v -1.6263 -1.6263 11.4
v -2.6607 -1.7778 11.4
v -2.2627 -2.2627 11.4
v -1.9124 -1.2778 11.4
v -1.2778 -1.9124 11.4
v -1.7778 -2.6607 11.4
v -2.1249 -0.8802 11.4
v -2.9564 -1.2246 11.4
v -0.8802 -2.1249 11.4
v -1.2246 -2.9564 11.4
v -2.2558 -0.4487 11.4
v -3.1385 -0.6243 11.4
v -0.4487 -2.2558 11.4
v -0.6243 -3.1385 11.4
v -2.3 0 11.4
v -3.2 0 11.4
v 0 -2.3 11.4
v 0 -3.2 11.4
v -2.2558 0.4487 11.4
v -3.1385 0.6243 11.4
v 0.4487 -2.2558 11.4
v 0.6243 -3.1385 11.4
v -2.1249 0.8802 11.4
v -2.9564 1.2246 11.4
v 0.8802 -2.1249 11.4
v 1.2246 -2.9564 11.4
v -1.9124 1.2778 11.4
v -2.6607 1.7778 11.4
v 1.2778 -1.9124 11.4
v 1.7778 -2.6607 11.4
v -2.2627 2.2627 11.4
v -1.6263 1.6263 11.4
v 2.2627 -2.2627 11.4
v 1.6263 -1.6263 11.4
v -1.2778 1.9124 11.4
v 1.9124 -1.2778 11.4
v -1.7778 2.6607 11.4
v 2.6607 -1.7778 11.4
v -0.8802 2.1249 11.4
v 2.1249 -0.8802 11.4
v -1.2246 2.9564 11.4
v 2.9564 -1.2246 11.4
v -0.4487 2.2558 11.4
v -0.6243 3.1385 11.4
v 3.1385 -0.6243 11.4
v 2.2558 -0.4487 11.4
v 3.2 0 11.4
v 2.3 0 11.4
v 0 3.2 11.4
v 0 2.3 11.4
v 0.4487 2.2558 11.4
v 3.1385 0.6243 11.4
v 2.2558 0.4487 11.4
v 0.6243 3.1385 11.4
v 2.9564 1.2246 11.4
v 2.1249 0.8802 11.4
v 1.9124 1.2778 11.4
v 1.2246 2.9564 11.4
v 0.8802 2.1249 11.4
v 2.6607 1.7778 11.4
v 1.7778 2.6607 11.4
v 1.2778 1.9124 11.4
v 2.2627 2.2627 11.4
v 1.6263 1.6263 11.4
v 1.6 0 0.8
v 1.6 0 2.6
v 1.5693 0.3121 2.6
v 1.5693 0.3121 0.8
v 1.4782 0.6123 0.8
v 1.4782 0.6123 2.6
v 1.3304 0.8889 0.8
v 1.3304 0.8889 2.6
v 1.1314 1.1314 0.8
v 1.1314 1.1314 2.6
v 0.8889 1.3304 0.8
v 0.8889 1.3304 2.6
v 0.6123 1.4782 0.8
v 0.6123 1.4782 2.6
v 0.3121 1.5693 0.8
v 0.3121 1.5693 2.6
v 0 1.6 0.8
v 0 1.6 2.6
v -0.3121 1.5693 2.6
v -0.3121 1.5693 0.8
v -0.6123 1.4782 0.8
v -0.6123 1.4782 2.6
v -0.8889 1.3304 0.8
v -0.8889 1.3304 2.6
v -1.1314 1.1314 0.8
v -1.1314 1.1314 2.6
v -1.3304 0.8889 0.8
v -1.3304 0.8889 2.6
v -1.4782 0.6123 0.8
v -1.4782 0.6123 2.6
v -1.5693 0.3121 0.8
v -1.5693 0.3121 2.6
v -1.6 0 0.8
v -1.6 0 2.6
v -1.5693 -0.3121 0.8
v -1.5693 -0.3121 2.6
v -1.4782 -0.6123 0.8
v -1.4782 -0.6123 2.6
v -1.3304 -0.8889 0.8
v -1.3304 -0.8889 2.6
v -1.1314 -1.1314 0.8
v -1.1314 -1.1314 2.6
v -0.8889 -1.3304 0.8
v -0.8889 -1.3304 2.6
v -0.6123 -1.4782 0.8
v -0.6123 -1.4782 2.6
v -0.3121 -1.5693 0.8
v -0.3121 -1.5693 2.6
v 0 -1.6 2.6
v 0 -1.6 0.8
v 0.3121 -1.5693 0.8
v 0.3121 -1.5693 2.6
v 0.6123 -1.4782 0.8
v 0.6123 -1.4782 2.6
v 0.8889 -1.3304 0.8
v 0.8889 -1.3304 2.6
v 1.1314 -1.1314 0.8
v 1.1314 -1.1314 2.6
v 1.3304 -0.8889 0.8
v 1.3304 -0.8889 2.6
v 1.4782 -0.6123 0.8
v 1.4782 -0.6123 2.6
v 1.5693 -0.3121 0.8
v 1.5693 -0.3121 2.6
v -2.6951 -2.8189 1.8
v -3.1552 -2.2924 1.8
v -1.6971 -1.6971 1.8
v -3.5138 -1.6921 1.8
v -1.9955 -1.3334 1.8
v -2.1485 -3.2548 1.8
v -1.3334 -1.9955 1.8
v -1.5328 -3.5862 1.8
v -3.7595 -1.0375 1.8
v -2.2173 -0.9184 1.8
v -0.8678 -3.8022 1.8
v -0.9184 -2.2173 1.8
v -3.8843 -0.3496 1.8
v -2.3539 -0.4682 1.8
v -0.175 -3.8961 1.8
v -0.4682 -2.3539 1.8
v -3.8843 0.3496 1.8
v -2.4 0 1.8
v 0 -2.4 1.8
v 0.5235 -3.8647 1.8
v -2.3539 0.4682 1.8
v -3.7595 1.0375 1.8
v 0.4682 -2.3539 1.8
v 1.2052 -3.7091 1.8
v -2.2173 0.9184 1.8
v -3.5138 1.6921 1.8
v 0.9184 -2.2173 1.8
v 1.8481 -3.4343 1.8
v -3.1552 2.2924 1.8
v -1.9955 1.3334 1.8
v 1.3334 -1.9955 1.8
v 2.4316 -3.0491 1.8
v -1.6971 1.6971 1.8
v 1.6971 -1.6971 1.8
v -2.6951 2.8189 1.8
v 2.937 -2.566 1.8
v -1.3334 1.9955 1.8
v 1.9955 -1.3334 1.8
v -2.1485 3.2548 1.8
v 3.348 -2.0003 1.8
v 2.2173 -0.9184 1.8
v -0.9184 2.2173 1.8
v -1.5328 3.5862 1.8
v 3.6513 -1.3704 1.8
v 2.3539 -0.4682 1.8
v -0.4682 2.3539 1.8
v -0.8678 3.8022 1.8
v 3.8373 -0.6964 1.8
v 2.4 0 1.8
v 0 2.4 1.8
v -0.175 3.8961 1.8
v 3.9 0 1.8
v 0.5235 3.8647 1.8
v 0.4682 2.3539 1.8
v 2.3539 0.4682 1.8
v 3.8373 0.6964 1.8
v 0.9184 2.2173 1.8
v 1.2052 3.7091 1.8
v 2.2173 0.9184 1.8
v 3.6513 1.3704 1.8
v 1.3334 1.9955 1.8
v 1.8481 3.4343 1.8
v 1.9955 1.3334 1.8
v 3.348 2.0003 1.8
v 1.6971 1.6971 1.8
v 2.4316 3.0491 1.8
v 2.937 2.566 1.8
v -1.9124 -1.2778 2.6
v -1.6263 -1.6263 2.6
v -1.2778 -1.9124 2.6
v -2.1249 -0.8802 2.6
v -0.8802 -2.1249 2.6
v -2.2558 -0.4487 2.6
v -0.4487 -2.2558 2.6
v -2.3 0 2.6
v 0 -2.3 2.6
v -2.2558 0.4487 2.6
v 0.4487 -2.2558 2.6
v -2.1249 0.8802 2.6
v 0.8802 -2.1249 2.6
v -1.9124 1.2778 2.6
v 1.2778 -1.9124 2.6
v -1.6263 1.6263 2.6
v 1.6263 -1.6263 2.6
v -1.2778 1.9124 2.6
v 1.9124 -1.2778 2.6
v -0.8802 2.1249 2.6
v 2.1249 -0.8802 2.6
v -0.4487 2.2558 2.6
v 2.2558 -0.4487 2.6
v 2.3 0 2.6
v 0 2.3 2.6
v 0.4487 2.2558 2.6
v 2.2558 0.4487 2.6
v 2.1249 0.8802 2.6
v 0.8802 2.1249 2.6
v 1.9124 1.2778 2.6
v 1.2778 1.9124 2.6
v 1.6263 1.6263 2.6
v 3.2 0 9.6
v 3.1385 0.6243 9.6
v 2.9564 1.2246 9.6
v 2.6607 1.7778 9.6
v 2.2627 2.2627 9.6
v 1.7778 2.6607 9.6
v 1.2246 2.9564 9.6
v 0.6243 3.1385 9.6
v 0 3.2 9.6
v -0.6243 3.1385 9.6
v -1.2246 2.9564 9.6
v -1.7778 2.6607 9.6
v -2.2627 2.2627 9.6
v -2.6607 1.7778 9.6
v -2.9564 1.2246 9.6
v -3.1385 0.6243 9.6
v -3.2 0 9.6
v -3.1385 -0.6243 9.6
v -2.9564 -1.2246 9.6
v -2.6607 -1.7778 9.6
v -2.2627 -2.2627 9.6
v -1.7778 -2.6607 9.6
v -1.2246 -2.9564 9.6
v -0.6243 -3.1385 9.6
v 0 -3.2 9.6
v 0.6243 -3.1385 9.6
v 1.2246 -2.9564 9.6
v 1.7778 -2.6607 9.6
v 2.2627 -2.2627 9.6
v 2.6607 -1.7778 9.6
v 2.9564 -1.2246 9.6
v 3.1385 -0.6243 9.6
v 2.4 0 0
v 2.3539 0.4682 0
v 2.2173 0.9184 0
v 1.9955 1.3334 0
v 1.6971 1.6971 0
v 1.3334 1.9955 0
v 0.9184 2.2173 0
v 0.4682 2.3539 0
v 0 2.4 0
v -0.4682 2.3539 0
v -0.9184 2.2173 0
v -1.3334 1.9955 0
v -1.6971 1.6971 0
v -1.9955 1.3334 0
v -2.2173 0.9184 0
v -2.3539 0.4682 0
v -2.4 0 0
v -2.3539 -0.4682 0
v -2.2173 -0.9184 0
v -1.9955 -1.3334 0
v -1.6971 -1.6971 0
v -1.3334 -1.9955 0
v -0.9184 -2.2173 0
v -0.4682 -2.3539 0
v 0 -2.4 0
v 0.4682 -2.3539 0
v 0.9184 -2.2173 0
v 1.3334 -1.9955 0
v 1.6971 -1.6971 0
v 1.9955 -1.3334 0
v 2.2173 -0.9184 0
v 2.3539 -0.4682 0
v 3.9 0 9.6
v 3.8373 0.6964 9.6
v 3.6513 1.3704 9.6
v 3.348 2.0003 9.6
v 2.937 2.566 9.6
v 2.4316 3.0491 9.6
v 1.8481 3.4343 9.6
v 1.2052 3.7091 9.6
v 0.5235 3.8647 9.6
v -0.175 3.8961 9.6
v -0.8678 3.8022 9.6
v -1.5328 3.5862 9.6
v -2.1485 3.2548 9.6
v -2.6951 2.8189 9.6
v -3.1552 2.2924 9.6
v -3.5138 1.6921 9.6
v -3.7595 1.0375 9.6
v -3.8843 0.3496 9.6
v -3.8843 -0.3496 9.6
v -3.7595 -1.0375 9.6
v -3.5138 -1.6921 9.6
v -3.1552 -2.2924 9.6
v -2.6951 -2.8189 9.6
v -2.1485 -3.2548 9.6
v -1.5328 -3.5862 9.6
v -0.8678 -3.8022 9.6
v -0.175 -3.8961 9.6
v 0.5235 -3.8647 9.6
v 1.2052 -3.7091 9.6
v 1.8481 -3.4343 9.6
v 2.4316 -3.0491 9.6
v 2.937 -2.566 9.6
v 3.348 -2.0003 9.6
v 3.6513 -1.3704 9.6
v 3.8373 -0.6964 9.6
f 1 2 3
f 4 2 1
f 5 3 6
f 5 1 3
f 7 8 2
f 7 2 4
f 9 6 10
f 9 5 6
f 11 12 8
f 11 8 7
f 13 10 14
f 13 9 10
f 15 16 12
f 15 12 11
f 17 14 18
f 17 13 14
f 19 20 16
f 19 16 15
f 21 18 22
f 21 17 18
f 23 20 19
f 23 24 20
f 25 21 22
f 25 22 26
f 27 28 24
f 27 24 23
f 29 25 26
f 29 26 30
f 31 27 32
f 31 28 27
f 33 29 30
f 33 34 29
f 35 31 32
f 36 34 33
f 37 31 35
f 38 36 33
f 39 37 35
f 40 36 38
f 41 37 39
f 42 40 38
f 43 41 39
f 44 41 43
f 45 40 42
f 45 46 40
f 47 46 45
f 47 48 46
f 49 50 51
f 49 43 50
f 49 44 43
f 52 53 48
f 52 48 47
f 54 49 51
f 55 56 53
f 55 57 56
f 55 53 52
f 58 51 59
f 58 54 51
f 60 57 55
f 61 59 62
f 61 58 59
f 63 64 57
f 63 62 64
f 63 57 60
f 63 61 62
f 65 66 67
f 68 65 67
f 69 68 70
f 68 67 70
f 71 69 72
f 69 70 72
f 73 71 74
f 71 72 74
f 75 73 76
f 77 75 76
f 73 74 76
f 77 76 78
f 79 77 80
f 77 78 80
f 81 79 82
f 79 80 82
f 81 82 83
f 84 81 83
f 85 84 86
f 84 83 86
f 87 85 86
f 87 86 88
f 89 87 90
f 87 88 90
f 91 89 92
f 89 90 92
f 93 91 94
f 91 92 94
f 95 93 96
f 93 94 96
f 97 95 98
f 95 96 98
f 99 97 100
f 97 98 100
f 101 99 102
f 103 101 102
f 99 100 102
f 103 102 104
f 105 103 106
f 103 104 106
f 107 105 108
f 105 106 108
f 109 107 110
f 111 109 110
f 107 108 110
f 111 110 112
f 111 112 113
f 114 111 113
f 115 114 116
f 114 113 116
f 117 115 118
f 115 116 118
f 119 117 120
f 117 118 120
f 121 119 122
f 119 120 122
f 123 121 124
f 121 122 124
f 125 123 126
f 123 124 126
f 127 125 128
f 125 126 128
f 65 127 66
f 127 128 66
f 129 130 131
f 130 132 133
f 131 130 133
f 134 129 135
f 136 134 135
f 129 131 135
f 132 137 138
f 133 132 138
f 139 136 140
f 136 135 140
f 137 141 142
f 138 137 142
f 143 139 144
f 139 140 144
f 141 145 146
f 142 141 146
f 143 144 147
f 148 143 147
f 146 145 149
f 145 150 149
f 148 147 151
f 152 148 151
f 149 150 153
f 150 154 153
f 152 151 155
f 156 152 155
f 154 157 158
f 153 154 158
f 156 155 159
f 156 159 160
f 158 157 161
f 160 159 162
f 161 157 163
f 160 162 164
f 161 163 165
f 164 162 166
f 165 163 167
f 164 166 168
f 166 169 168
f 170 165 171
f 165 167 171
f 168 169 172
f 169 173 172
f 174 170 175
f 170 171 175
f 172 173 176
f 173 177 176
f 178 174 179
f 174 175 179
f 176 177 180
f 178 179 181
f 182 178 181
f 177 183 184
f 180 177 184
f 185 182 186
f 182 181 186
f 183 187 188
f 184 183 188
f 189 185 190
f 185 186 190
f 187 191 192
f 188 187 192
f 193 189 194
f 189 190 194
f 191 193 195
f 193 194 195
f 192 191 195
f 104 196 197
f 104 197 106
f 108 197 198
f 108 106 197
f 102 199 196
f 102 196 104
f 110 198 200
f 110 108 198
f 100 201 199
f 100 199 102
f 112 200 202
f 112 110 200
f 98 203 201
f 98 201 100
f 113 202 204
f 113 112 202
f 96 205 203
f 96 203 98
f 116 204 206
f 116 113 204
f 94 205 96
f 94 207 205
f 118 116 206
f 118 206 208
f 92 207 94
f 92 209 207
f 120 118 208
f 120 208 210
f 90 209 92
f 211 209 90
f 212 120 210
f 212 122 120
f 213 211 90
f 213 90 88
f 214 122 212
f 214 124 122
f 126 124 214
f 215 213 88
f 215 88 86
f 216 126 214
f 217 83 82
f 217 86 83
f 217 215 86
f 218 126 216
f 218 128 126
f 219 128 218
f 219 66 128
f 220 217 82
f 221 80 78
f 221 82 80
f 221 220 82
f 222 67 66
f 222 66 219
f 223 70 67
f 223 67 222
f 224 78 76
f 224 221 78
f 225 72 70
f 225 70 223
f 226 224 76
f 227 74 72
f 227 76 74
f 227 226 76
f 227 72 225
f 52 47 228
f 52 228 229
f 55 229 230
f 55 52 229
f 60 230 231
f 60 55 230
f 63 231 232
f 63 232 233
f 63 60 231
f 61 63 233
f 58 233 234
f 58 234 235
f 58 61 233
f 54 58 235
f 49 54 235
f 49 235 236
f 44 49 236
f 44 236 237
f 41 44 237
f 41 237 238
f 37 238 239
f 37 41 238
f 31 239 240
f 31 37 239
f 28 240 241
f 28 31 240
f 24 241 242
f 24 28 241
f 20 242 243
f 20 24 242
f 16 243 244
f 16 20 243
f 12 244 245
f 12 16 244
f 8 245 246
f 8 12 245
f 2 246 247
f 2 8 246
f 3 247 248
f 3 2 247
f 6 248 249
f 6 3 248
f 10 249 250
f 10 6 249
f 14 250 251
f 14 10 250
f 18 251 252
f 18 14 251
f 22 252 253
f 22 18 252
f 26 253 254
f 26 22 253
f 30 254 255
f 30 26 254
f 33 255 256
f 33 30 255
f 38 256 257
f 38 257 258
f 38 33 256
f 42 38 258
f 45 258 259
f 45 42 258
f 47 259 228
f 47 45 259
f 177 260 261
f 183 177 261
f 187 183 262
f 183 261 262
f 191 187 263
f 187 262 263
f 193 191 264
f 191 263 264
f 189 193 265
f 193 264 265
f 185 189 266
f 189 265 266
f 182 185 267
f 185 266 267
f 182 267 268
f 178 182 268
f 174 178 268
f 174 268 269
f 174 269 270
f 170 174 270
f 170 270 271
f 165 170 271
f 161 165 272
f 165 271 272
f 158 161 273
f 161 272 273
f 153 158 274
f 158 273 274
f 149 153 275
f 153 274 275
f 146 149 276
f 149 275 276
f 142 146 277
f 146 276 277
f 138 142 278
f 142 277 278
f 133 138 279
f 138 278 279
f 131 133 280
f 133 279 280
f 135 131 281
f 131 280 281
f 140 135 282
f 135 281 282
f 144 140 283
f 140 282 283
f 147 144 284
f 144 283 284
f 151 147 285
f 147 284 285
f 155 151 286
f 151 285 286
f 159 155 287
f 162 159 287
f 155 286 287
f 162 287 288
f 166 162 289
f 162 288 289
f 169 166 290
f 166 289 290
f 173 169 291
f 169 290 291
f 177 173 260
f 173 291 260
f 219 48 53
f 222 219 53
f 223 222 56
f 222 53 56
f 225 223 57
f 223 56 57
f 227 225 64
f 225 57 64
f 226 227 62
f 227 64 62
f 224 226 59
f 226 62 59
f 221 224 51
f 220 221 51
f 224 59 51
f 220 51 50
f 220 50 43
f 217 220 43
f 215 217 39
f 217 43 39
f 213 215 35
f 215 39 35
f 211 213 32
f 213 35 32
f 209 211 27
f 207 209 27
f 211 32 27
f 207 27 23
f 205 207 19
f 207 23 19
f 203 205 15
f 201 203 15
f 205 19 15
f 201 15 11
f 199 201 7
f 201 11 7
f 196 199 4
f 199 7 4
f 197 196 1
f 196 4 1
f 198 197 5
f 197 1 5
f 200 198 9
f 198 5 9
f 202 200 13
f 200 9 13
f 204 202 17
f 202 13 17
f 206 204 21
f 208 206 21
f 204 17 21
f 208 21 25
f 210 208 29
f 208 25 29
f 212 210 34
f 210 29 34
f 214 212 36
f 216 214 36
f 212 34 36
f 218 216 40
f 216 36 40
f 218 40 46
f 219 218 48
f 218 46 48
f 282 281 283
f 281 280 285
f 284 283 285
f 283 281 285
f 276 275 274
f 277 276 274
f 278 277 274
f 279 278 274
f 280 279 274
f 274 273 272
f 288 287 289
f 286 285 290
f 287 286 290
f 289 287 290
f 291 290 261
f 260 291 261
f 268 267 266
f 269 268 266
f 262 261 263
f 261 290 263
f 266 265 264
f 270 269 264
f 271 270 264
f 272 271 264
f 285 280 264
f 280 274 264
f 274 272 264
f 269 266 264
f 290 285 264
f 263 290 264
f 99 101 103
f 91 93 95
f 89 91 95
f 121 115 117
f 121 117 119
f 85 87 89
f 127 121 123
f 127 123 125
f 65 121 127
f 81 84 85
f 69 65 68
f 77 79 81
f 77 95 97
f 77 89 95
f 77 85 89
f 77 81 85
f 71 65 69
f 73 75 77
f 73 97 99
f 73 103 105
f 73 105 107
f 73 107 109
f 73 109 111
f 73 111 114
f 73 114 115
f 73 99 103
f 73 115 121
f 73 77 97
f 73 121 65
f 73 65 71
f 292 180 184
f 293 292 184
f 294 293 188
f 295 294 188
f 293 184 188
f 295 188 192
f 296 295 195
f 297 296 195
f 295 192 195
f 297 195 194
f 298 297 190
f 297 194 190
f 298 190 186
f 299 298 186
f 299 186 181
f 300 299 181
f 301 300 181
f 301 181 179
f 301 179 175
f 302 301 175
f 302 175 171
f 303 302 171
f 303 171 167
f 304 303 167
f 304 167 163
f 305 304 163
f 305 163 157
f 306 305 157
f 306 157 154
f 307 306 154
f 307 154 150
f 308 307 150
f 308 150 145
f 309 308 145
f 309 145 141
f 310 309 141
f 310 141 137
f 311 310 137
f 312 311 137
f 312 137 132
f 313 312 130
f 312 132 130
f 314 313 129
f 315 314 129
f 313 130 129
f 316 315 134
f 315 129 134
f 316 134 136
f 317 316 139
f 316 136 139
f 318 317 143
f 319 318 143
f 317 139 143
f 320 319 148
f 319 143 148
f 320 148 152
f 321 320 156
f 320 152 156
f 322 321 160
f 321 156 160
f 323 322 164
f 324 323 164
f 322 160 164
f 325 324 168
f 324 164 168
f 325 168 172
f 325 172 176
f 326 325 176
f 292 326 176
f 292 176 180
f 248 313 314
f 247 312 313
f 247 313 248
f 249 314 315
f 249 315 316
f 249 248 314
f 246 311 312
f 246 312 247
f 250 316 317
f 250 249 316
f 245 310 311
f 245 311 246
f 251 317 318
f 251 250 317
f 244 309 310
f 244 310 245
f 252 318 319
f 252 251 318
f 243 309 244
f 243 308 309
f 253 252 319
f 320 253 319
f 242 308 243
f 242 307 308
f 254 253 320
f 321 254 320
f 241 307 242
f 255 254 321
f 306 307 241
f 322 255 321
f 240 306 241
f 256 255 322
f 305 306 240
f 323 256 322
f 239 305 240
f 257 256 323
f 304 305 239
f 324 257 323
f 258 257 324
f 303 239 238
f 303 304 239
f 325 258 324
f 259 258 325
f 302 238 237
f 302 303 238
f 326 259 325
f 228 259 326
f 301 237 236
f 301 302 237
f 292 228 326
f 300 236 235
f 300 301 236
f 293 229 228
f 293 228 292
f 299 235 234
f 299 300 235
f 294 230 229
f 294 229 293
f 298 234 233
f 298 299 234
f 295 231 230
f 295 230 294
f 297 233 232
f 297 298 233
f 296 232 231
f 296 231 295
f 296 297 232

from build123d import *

# Parameters (mm, degrees)
F0_R     = 2.4
F1_DEPTH = 1.8
F2_R     = 3.9
F2_R_2   = 2.4
F3_DEPTH = 9.6
F4_R     = 3.9
F4_R_2   = 3.2
F5_DEPTH = 1.8
F6_R     = 2.3
F7_DEPTH = 8.8
F8_R     = 1.6
F9_DEPTH = 1.8


# Not quite as in the source:
# - a feature names something its author has since deleted; it is built from what else it names


with BuildPart() as f1:
    # F0 (on Top) → F1 (new body)
    with BuildSketch(Plane.XY):
        Circle(F0_R)
    extrude(amount=F1_DEPTH)

    # F2 (on face) → F3 (join)
    with BuildSketch(Plane.XY.offset(1.8)):
        Circle(F2_R)
        Circle(F2_R_2, mode=Mode.SUBTRACT)
        Circle(F2_R_2)
    extrude(amount=F3_DEPTH)

    # F4 (on face) → F5 (cut)
    with BuildSketch(Plane.XY.offset(11.4)):
        Circle(F4_R)
        Circle(F4_R_2, mode=Mode.SUBTRACT)
    extrude(amount=-F5_DEPTH, mode=Mode.SUBTRACT)

    # F6 (on face) → F7 (cut)
    with BuildSketch(Plane.XY.offset(11.4)):
        Circle(F6_R)
    extrude(amount=-F7_DEPTH, mode=Mode.SUBTRACT)

    # F8 (on face) → F9 (cut)
    with BuildSketch(Plane.XY.offset(2.6)):
        Circle(F8_R)
    extrude(amount=-F9_DEPTH, mode=Mode.SUBTRACT)


solid = f1.part
